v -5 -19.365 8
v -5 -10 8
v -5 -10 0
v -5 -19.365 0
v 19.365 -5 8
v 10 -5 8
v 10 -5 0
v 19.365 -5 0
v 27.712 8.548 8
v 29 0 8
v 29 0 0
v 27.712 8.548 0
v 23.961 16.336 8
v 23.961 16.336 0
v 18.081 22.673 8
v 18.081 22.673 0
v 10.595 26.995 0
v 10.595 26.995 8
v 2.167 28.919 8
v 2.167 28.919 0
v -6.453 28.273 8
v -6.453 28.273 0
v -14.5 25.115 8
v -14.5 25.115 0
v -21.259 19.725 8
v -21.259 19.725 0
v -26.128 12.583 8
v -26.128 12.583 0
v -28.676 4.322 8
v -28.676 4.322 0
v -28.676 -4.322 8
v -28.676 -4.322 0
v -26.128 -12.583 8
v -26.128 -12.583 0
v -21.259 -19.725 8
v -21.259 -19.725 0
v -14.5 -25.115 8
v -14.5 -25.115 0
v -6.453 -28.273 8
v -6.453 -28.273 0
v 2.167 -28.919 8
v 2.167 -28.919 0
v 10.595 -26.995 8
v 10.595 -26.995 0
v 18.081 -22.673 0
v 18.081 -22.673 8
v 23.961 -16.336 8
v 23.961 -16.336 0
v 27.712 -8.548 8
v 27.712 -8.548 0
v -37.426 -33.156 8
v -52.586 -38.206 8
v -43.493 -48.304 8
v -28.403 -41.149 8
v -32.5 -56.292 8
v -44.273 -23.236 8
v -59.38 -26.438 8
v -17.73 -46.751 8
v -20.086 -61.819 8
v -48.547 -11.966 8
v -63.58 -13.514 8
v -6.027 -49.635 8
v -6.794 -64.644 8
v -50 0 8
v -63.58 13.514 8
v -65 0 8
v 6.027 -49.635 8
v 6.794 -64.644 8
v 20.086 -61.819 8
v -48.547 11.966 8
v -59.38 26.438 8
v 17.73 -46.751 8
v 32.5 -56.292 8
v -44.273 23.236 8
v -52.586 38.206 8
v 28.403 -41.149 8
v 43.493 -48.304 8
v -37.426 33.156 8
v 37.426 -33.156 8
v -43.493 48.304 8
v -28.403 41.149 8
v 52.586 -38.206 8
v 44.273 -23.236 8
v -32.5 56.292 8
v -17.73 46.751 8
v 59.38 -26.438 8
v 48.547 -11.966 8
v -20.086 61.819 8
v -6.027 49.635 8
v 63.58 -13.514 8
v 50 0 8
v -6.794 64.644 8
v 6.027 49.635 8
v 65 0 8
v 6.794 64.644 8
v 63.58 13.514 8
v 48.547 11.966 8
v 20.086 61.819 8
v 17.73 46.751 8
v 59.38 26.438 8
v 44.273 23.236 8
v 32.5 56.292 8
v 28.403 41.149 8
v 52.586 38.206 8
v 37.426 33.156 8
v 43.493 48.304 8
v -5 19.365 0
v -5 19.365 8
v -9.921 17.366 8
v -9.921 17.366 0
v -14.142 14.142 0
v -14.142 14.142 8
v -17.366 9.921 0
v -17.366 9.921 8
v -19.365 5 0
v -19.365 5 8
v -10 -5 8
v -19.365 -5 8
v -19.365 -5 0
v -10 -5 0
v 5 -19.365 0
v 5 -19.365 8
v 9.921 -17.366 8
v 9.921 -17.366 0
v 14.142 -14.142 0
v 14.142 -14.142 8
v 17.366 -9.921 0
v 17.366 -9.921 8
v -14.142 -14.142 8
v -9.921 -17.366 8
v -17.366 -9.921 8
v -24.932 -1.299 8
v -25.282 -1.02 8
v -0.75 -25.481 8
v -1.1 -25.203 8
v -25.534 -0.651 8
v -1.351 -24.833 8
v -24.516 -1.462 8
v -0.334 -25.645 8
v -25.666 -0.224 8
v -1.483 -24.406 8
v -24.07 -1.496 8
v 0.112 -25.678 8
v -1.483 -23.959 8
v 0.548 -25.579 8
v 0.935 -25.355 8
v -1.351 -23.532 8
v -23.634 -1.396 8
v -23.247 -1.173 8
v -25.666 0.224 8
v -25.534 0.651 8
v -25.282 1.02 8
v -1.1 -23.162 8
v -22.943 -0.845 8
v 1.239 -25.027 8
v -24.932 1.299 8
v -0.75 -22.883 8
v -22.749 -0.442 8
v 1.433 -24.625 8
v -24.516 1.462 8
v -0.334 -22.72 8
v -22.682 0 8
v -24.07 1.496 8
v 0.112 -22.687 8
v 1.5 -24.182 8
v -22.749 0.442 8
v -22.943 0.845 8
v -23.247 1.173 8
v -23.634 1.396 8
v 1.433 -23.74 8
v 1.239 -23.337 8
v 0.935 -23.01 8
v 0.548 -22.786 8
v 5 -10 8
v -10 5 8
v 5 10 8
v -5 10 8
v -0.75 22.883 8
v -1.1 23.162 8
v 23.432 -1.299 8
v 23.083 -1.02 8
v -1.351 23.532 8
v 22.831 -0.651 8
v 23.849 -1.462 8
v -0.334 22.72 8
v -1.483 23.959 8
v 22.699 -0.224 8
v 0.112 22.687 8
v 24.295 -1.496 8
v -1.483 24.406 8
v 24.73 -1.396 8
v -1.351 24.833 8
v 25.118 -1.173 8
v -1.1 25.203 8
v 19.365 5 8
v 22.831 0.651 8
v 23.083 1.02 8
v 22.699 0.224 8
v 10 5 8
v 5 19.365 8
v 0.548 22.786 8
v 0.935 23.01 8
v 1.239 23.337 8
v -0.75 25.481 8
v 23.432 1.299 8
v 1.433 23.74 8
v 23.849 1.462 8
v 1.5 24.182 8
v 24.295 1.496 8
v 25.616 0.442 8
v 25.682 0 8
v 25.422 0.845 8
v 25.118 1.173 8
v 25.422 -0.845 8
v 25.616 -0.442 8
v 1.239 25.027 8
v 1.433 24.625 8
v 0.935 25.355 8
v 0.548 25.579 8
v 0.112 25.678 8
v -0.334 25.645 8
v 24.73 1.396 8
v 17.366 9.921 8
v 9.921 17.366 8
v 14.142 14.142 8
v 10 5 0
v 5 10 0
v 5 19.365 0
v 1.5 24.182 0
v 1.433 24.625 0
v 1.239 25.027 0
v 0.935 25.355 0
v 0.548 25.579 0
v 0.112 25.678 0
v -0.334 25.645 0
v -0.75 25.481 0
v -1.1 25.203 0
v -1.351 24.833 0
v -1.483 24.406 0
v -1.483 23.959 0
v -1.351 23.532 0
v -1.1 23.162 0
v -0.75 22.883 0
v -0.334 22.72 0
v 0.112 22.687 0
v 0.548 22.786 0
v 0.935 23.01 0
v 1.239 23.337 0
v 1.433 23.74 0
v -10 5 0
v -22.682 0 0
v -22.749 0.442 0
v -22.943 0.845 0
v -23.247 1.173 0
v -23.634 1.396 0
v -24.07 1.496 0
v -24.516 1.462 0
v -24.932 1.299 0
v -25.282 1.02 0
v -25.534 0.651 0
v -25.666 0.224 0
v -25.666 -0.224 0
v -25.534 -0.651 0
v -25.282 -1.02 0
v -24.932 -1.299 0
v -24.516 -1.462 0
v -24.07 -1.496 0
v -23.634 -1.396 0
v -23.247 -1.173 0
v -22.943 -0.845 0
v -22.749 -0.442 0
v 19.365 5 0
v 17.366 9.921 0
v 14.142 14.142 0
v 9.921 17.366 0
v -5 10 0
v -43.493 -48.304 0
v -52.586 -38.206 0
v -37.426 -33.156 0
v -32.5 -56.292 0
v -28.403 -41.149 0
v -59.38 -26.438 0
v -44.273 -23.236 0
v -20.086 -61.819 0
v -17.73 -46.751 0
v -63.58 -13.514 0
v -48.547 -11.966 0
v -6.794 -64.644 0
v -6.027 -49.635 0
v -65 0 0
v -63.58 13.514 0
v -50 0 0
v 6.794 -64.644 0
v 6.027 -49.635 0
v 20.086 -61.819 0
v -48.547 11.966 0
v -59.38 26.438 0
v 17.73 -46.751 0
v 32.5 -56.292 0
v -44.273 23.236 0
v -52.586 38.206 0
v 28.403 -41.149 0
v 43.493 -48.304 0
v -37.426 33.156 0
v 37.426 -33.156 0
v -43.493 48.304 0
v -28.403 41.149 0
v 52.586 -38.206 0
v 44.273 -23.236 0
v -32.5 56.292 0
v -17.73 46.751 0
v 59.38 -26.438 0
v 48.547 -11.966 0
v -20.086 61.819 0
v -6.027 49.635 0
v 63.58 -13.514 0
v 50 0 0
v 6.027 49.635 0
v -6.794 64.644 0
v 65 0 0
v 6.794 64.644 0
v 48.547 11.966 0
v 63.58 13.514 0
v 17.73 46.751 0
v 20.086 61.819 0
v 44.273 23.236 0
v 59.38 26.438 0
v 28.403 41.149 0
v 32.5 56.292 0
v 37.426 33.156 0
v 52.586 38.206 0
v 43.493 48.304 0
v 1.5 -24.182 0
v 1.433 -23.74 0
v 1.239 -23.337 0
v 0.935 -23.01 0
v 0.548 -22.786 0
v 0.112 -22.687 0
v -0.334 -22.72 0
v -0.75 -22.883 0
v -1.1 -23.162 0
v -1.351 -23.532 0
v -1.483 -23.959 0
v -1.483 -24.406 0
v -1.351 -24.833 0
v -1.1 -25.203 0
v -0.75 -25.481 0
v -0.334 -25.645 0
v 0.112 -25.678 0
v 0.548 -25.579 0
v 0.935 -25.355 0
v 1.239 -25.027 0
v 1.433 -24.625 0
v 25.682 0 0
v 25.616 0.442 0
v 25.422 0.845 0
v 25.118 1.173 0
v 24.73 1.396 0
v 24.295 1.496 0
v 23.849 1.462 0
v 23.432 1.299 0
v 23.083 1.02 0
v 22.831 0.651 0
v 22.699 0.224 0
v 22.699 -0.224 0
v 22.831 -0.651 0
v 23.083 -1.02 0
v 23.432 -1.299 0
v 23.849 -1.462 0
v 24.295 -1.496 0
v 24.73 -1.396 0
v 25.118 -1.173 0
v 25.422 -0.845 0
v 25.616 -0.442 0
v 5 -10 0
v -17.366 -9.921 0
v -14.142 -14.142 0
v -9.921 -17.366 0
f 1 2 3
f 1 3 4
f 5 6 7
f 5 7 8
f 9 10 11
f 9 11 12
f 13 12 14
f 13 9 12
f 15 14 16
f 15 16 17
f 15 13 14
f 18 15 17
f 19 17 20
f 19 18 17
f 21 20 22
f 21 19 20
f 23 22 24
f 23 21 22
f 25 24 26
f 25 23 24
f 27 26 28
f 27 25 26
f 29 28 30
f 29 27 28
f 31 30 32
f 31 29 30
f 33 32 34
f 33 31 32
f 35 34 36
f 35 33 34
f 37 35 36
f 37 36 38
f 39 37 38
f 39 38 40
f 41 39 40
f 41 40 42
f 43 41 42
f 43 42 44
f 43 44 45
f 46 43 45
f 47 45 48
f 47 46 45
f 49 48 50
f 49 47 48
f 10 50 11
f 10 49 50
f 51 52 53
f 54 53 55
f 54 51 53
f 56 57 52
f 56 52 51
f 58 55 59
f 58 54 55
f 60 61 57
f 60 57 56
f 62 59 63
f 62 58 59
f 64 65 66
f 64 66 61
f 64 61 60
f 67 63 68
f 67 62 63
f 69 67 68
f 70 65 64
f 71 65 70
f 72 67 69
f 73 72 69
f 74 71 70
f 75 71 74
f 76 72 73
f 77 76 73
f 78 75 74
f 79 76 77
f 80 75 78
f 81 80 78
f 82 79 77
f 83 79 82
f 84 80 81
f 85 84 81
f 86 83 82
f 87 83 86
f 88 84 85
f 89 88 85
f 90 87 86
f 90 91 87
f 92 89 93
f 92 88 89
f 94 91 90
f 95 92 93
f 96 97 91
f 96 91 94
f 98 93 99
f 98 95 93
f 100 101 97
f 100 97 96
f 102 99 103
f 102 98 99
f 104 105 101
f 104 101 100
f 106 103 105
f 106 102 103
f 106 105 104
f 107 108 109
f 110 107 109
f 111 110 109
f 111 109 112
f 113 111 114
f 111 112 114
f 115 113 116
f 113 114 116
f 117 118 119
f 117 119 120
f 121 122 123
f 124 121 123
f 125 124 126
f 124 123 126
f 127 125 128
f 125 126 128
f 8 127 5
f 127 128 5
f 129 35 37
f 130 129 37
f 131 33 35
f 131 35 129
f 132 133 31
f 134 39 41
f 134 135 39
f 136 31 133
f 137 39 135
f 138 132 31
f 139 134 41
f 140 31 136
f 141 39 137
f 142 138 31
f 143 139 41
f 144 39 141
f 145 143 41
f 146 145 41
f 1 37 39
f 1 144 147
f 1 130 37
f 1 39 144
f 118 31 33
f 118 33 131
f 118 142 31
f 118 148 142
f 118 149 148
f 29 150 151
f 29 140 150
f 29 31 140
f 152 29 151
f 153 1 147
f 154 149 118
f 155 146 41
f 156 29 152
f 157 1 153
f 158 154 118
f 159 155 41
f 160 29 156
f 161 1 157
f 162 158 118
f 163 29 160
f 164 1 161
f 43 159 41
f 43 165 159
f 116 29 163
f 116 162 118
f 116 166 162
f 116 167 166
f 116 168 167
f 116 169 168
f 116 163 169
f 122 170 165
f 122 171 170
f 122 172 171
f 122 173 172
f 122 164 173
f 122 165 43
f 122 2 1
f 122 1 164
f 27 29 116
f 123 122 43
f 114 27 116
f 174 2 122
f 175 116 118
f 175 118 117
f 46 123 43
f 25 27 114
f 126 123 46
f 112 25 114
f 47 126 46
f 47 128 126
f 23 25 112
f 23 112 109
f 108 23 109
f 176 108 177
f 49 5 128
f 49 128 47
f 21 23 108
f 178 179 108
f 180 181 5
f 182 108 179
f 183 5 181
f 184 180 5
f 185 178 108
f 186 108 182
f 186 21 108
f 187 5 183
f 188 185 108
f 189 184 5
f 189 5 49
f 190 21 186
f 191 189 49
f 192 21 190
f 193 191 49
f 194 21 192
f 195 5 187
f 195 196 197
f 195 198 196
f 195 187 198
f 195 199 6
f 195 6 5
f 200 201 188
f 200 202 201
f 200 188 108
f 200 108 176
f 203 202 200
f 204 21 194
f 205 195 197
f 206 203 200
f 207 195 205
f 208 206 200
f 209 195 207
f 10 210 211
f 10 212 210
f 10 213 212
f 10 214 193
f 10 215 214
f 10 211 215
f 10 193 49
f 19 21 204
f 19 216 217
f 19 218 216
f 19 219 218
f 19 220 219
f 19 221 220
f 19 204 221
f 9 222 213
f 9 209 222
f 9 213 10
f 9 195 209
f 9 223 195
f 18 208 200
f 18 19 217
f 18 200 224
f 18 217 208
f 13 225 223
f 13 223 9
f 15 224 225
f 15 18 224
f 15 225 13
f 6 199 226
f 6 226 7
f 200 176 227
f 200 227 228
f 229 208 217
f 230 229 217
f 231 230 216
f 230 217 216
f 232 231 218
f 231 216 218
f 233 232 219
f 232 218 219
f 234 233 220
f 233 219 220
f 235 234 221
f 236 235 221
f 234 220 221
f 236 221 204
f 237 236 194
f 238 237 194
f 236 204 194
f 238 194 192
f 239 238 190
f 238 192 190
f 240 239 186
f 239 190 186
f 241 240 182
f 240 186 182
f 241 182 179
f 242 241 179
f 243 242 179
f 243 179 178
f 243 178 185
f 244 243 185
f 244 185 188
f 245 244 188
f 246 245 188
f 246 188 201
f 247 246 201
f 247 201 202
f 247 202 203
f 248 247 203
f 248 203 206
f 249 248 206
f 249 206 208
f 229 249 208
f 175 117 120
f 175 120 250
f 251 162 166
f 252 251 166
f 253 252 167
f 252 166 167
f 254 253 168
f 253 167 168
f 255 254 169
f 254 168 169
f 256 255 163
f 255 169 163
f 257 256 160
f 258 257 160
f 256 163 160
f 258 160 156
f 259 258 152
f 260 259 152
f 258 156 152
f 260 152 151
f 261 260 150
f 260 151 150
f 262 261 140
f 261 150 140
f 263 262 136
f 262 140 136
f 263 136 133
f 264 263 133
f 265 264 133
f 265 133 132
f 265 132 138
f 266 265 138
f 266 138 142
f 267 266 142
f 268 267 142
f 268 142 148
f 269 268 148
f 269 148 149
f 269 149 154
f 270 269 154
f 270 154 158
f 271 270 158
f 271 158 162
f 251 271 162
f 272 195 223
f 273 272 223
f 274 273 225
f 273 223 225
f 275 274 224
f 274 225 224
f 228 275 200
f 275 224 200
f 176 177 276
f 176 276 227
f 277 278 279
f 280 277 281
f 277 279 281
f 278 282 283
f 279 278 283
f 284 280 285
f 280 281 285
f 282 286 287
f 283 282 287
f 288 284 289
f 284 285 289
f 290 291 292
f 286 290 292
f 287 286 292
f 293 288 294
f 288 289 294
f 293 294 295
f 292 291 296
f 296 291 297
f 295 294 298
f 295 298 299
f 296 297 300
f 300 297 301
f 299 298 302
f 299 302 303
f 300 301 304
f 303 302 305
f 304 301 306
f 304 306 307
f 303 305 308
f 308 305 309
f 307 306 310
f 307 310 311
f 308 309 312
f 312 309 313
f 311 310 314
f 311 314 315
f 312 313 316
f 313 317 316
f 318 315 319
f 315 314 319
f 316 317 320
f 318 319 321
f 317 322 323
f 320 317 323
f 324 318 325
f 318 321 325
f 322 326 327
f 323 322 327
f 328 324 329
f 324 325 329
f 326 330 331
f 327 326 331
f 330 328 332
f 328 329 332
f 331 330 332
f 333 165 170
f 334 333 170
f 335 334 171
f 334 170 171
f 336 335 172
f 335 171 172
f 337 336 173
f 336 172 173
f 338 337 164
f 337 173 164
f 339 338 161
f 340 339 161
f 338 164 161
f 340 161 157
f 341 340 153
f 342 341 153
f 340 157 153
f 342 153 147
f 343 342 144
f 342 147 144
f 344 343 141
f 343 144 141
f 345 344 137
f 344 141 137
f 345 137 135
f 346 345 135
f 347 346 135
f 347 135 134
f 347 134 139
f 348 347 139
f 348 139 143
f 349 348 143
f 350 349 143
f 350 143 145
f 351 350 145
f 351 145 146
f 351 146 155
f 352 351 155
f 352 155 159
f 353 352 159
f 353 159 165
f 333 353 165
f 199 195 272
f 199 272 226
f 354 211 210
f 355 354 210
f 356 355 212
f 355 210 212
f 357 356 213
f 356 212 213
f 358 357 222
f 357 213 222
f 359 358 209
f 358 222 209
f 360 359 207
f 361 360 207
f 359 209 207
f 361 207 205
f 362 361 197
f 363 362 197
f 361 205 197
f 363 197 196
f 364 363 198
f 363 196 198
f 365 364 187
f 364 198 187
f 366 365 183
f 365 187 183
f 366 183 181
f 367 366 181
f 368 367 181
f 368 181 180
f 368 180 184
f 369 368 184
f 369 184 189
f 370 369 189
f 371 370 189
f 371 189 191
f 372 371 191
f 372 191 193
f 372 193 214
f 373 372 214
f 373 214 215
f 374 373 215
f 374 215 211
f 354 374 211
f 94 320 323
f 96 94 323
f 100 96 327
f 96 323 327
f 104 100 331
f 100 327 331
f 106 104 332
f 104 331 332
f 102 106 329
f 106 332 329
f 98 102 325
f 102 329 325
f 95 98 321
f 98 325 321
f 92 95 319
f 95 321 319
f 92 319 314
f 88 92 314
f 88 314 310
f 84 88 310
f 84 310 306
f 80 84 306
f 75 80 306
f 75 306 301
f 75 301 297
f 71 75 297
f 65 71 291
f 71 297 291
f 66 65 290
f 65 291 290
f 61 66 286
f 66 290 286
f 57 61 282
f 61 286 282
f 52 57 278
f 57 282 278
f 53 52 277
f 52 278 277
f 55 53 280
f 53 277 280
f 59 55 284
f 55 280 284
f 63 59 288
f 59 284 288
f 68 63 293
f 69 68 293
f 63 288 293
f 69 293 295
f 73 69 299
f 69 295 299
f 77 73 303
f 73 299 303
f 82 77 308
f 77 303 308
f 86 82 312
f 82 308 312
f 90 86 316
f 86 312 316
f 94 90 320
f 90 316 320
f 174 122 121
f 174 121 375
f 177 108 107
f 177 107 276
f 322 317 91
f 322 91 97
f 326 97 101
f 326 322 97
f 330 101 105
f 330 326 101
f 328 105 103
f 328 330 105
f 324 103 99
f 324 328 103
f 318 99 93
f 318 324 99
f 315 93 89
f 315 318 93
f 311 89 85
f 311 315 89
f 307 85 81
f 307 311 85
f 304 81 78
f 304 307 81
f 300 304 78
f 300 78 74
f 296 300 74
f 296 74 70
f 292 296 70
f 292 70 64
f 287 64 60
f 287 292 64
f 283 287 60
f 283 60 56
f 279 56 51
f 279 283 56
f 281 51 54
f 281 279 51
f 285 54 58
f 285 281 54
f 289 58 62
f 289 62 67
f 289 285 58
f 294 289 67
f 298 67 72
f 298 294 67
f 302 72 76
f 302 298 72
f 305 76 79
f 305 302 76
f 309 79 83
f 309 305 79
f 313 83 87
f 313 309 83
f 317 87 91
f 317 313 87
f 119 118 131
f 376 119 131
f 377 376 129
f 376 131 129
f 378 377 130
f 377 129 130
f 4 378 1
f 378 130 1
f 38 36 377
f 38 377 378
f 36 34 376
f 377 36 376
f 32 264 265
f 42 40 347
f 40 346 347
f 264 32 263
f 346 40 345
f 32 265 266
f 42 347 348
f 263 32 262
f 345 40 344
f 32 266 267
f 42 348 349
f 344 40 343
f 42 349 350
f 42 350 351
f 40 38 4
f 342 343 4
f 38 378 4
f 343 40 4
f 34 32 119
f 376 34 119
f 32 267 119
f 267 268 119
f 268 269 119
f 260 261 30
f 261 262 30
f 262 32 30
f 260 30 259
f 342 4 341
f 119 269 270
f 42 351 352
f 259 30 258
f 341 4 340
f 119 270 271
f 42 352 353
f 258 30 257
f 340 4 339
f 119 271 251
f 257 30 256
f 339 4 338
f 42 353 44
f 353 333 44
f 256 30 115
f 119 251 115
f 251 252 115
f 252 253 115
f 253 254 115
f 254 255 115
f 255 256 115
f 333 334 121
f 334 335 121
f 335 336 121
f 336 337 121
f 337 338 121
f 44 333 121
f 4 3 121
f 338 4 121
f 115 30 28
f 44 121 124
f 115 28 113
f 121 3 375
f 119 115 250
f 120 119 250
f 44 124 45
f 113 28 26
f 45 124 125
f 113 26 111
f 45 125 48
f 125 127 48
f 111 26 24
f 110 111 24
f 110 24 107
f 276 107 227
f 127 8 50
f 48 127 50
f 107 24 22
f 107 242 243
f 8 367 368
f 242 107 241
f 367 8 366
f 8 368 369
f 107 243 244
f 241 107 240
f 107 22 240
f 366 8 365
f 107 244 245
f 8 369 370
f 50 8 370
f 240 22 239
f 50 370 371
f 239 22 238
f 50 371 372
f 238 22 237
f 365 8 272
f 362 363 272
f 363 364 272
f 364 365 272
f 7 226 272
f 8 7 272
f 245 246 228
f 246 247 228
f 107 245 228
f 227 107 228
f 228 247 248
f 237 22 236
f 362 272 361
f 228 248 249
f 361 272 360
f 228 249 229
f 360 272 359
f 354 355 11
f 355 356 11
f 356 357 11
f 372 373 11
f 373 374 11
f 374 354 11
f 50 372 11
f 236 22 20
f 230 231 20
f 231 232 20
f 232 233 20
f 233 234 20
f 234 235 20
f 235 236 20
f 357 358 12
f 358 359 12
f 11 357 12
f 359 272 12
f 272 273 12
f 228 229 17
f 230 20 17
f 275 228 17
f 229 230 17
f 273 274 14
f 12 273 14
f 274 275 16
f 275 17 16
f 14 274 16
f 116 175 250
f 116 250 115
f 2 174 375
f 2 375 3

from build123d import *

# Parameters (mm, degrees)
SKETCH1_R                 = 65
SKETCH1_R_2               = 50
OUTER_RING_DEPTH          = 8
SKETCH6_R                 = 29
SKETCH6_R_2               = 20
INNER_RING_DEPTH          = 8
MOTOR_CONNECTOR_CUT_DEPTH = 8
SKETCH8_R                 = 1.5
M3_HOLES_DEPTH            = 38
M3_HOLES_DEPTH_BACK       = 14


with BuildPart() as part:
    # Sketch1 → Outer Ring (new body)
    with BuildSketch(Plane.XY):
        Circle(SKETCH1_R)
        Circle(SKETCH1_R_2, mode=Mode.SUBTRACT)
    extrude(amount=OUTER_RING_DEPTH)


with BuildPart() as body_2:
    # Sketch6 → Inner Ring (new body)
    with BuildSketch(Plane.XY.offset(8)):
        Circle(SKETCH6_R)
        Circle(SKETCH6_R_2, mode=Mode.SUBTRACT)
    extrude(amount=-INNER_RING_DEPTH)

    # Sketch7 → Motor Connector Cut (add)
    with BuildSketch(Plane.XY.offset(8)):
        with BuildLine():
            ThreePointArc((20, 0), (19.840593925, 2.52008585), (19.364916731, 5))
            Line((19.364916731, 5), (9.999996731, 5))
            Line((9.999996731, 5), (9.999996731, -5))
            Line((9.999996731, -5), (19.364916731, -5))
            ThreePointArc((19.364916731, -5), (19.840593925, -2.52008585), (20, 0))
        make_face()
        with BuildLine():
            ThreePointArc((5, 19.364916731), (0, 20), (-5, 19.364916731))
            Line((-5, 19.364916731), (-5, 9.999996731))
            Line((-5, 9.999996731), (5, 9.999996731))
            Line((5, 9.999996731), (5, 19.364916731))
        make_face()
        with BuildLine():
            Line((-9.999996731, -5), (-9.999996731, 5))
            Line((-9.999996731, 5), (-19.364916731, 5))
            ThreePointArc((-19.364916731, 5), (-20, 0), (-19.364916731, -5))
            Line((-19.364916731, -5), (-9.999996731, -5))
        make_face()
        with BuildLine():
            Line((-5, -9.999996731), (-5, -19.364916731))
            ThreePointArc((-5, -19.364916731), (0, -20), (5, -19.364916731))
            Line((5, -19.364916731), (5, -9.999996731))
            Line((5, -9.999996731), (-5, -9.999996731))
        make_face()
    extrude(amount=-MOTOR_CONNECTOR_CUT_DEPTH)

    # Sketch8 → M3 Holes (cut, two sides)
    with BuildSketch(Plane.XY.offset(8)) as m3_holes_sk:
        with Locations((0, 24.182458366)):
            Circle(SKETCH8_R)
        with Locations((24.182458366, 0)):
            Circle(SKETCH8_R)
        with Locations((0, -24.182458366)):
            Circle(SKETCH8_R)
        with Locations((-24.182458366, 0)):
            Circle(SKETCH8_R)
    extrude(amount=M3_HOLES_DEPTH, mode=Mode.SUBTRACT)
    extrude(m3_holes_sk.sketch, amount=-M3_HOLES_DEPTH_BACK, mode=Mode.SUBTRACT)


solid = Compound([part.part, body_2.part])
